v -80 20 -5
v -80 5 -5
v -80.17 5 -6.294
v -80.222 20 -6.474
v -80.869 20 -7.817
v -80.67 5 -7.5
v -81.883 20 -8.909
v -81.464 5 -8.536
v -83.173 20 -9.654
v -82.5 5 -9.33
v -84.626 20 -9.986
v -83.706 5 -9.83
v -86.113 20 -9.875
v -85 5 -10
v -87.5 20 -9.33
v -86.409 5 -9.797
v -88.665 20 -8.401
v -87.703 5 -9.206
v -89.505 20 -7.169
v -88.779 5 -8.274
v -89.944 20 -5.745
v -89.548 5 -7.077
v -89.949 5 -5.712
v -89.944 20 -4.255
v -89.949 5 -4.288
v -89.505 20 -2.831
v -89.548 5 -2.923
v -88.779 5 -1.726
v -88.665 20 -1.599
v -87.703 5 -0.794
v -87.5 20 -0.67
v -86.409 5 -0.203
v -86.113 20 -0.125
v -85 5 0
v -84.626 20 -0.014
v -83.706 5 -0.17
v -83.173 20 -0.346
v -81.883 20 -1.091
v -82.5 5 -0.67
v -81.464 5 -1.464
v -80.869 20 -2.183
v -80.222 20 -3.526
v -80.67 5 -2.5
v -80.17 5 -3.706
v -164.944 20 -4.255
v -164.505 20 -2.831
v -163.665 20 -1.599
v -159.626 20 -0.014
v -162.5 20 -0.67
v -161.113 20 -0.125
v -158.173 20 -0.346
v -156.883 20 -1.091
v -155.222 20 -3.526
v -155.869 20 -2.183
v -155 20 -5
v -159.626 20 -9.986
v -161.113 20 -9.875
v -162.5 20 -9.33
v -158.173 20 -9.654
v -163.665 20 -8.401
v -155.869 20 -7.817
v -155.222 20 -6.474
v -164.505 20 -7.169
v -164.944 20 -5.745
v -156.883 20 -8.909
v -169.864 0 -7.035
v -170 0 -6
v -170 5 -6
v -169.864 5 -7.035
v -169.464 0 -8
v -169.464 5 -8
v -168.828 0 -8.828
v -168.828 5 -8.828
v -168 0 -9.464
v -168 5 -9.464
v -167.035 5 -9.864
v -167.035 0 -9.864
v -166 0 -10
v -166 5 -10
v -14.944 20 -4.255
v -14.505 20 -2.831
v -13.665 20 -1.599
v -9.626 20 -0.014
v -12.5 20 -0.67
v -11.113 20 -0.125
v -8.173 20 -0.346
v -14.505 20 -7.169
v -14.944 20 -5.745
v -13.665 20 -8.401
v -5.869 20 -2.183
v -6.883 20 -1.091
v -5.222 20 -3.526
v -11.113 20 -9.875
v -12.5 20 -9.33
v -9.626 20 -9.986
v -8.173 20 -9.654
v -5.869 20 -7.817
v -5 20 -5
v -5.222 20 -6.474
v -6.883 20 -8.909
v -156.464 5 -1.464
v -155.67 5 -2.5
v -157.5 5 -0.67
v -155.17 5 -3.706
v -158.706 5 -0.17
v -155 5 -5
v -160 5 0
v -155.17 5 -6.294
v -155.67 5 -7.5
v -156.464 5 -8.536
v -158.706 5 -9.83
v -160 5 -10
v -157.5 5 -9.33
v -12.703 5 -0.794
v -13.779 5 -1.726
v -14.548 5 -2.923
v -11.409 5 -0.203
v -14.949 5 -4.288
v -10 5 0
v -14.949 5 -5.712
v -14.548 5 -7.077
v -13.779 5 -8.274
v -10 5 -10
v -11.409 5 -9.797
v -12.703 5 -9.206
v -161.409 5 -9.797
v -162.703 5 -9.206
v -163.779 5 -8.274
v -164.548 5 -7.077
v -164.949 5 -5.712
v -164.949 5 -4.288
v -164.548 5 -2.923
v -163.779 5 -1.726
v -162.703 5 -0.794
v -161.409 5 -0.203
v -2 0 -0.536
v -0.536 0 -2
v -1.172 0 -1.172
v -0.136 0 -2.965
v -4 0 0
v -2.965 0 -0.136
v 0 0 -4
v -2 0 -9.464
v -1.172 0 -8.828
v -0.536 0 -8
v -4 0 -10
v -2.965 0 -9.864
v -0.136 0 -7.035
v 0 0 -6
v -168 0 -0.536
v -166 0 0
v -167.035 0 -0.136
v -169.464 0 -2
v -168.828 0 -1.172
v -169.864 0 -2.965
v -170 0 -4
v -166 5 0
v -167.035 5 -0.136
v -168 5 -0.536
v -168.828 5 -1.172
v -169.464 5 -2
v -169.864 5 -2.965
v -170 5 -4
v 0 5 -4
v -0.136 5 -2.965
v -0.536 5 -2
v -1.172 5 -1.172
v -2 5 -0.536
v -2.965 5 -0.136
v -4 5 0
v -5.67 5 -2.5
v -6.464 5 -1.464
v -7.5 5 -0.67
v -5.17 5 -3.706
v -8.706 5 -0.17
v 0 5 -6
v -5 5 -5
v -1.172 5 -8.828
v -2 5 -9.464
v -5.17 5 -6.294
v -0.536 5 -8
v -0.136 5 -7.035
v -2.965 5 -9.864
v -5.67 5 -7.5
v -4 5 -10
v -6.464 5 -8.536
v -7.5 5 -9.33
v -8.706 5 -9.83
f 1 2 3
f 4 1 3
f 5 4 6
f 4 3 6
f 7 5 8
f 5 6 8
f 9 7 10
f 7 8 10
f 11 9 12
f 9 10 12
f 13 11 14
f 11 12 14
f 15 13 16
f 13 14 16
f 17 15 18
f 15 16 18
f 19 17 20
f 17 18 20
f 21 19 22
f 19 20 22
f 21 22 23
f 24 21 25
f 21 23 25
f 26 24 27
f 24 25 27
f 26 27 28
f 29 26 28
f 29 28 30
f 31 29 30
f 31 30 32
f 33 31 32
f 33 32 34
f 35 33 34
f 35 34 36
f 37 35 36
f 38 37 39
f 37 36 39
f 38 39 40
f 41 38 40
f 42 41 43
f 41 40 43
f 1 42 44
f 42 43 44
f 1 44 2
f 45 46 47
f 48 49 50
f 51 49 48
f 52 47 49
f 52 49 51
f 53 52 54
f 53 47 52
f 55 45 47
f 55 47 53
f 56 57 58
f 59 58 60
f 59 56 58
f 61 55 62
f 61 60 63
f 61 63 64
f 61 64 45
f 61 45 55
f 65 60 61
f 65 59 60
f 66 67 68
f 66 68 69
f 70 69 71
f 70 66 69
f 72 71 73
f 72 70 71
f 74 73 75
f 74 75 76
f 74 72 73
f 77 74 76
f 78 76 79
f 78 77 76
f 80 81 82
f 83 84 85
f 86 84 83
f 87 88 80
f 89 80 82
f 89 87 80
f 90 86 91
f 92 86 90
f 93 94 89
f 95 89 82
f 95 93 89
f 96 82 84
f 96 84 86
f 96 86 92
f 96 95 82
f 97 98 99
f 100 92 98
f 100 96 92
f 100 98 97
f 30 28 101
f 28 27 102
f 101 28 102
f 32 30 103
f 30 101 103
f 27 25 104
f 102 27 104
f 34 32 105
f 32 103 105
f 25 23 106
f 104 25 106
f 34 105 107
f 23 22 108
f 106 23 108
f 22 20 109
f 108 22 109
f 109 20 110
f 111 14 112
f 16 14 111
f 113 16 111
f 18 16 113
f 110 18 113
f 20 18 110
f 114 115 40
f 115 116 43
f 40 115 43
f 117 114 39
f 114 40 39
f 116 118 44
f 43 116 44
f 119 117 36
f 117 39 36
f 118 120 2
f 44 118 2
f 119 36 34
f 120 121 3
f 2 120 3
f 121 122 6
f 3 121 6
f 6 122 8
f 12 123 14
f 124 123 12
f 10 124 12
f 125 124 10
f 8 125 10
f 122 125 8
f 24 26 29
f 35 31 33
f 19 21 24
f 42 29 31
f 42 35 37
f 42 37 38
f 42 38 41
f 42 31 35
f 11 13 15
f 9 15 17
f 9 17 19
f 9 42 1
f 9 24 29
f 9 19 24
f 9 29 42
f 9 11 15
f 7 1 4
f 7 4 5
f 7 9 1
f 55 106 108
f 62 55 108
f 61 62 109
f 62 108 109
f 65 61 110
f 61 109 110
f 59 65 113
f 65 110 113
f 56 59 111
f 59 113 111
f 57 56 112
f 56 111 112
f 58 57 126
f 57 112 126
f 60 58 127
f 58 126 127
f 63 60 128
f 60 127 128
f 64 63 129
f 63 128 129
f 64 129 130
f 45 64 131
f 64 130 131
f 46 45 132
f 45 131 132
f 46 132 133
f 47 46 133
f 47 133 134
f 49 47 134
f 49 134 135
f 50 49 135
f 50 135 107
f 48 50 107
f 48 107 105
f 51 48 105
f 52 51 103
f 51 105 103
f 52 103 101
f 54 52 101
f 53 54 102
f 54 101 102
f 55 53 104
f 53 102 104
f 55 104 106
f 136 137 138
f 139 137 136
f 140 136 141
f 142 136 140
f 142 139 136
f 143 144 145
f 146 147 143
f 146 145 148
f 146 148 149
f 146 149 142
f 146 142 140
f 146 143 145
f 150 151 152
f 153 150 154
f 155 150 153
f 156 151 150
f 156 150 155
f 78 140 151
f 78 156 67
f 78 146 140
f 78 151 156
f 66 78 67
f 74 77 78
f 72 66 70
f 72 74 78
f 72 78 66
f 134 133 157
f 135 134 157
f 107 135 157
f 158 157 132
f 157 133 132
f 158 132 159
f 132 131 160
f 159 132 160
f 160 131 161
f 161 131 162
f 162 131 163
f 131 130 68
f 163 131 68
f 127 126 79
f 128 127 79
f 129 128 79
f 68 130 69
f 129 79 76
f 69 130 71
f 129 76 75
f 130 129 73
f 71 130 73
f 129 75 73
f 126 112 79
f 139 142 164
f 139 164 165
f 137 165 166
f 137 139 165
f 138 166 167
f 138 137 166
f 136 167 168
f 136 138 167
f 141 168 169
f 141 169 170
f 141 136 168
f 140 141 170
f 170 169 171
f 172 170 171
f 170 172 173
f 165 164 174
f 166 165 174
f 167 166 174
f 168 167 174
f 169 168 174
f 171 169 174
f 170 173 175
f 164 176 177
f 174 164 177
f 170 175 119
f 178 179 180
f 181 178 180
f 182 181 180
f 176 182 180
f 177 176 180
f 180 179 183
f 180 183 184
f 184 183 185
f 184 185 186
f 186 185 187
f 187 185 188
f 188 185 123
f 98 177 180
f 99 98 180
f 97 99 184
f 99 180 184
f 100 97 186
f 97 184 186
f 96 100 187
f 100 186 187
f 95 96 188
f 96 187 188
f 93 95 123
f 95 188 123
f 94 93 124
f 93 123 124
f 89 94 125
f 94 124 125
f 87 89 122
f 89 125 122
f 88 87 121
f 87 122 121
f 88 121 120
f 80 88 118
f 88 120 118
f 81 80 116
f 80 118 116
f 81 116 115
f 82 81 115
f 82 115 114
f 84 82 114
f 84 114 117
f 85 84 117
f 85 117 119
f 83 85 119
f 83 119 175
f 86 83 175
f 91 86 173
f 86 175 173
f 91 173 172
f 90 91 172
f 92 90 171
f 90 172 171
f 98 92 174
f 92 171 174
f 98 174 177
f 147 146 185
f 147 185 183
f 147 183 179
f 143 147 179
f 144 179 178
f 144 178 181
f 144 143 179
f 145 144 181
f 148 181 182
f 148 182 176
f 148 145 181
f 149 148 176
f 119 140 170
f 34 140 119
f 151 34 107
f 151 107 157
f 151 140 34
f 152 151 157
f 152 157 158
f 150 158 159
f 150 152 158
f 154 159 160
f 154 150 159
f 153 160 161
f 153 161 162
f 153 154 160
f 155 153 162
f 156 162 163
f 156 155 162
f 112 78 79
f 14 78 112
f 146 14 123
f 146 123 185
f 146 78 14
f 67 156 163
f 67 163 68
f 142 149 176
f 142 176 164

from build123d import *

# Parameters (mm, degrees)
BOSS_EXTRU_1_DEPTH = 5
ESQUISSE2_R        = 5
BOSS_EXTRU_2_DEPTH = 15


with BuildPart() as part:
    # Esquisse1 → Boss.-Extru.1 (new body)
    with BuildSketch(Plane(origin=(0, 0, 0), x_dir=(1, 0, 0), z_dir=(0, 1, 0))):
        with BuildLine():
            Line((-4, 0), (-166, 0))
            ThreePointArc((-166, 0), (-168.828427125, 1.171572875), (-170, 4))
            Line((-170, 4), (-170, 6))
            ThreePointArc((-170, 6), (-168.828427125, 8.828427125), (-166, 10))
            Line((-166, 10), (-4, 10))
            ThreePointArc((-4, 10), (-1.171572875, 8.828427125), (0, 6))
            Line((0, 6), (0, 4))
            ThreePointArc((0, 4), (-1.171572875, 1.171572875), (-4, 0))
        make_face()
    extrude(amount=BOSS_EXTRU_1_DEPTH)

    # Esquisse2 → Boss.-Extru.2 (add)
    with BuildSketch(Plane(origin=(0, 5, 0), x_dir=(1, 0, 0), z_dir=(0, 1, 0))):
        with Locations((-160, 5)):
            Circle(ESQUISSE2_R)
        with Locations((-85, 5)):
            Circle(ESQUISSE2_R)
        with Locations((-10, 5)):
            Circle(ESQUISSE2_R)
    extrude(amount=BOSS_EXTRU_2_DEPTH)


solid = part.part
